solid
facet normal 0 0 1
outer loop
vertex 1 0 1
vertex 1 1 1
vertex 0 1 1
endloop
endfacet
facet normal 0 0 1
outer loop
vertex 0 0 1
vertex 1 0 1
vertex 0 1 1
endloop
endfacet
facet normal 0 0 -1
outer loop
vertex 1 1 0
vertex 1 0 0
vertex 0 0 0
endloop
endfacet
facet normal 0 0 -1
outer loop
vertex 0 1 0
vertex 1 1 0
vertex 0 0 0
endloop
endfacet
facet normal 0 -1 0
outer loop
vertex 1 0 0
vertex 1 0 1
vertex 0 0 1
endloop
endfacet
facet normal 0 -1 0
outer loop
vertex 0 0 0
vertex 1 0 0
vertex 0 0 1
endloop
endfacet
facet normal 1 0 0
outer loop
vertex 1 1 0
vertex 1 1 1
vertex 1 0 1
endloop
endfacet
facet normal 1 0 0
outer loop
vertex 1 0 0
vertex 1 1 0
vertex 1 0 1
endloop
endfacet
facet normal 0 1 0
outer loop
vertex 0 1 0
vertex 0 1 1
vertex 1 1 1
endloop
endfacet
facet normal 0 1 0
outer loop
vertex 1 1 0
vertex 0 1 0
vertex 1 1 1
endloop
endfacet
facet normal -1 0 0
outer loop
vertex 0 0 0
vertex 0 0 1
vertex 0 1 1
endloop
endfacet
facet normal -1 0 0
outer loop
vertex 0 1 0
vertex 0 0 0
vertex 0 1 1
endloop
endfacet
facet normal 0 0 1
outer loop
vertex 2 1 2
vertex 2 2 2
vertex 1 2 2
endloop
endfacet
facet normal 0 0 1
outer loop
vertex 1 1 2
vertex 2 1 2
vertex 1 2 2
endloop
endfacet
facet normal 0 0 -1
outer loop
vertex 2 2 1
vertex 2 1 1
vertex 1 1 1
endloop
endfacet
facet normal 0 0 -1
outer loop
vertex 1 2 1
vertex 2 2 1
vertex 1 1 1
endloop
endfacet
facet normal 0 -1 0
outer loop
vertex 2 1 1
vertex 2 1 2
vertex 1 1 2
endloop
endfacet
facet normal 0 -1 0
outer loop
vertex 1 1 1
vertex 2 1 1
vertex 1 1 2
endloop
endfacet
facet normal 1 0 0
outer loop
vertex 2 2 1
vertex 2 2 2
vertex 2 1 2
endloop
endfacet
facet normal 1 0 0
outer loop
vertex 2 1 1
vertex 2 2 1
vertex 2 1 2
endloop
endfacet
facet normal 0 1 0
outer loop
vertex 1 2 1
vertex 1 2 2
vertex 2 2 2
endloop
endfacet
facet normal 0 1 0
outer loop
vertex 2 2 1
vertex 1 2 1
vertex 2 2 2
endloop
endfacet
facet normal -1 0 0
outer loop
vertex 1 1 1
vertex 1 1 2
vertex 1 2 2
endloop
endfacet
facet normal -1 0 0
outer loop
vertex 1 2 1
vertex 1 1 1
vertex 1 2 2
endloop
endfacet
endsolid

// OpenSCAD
polyhedron(
  points=[
    [0, 0, 0],
    [1, 0, 0],
    [0, 1, 0],
    [1, 1, 0],
    [0, 0, 1],
    [1, 0, 1],
    [0, 1, 1],
    [1, 1, 1],

    [2, 1, 1],
    [1, 2, 1],
    [2, 2, 1],
    [1, 1, 2],
    [2, 1, 2],
    [1, 2, 2],
    [2, 2, 2],
  ],
  faces=[
    [6,7,5],[6,5,4],
    [0,1,3],[0,3,2],
    [4,5,1],[4,1,0],
    [5,7,3],[5,3,1],
    [7,6,2],[7,2,3],
    [6,4,0],[6,0,2],

    [13,14,12],[13,12,11],
    [7,8,10],[7,10,9],
    [11,12,8],[11,8,7],
    [12,14,10],[12,10,8],
    [14,13,9],[14,9,10],
    [13,11,7],[13,7,9],
  ]);
